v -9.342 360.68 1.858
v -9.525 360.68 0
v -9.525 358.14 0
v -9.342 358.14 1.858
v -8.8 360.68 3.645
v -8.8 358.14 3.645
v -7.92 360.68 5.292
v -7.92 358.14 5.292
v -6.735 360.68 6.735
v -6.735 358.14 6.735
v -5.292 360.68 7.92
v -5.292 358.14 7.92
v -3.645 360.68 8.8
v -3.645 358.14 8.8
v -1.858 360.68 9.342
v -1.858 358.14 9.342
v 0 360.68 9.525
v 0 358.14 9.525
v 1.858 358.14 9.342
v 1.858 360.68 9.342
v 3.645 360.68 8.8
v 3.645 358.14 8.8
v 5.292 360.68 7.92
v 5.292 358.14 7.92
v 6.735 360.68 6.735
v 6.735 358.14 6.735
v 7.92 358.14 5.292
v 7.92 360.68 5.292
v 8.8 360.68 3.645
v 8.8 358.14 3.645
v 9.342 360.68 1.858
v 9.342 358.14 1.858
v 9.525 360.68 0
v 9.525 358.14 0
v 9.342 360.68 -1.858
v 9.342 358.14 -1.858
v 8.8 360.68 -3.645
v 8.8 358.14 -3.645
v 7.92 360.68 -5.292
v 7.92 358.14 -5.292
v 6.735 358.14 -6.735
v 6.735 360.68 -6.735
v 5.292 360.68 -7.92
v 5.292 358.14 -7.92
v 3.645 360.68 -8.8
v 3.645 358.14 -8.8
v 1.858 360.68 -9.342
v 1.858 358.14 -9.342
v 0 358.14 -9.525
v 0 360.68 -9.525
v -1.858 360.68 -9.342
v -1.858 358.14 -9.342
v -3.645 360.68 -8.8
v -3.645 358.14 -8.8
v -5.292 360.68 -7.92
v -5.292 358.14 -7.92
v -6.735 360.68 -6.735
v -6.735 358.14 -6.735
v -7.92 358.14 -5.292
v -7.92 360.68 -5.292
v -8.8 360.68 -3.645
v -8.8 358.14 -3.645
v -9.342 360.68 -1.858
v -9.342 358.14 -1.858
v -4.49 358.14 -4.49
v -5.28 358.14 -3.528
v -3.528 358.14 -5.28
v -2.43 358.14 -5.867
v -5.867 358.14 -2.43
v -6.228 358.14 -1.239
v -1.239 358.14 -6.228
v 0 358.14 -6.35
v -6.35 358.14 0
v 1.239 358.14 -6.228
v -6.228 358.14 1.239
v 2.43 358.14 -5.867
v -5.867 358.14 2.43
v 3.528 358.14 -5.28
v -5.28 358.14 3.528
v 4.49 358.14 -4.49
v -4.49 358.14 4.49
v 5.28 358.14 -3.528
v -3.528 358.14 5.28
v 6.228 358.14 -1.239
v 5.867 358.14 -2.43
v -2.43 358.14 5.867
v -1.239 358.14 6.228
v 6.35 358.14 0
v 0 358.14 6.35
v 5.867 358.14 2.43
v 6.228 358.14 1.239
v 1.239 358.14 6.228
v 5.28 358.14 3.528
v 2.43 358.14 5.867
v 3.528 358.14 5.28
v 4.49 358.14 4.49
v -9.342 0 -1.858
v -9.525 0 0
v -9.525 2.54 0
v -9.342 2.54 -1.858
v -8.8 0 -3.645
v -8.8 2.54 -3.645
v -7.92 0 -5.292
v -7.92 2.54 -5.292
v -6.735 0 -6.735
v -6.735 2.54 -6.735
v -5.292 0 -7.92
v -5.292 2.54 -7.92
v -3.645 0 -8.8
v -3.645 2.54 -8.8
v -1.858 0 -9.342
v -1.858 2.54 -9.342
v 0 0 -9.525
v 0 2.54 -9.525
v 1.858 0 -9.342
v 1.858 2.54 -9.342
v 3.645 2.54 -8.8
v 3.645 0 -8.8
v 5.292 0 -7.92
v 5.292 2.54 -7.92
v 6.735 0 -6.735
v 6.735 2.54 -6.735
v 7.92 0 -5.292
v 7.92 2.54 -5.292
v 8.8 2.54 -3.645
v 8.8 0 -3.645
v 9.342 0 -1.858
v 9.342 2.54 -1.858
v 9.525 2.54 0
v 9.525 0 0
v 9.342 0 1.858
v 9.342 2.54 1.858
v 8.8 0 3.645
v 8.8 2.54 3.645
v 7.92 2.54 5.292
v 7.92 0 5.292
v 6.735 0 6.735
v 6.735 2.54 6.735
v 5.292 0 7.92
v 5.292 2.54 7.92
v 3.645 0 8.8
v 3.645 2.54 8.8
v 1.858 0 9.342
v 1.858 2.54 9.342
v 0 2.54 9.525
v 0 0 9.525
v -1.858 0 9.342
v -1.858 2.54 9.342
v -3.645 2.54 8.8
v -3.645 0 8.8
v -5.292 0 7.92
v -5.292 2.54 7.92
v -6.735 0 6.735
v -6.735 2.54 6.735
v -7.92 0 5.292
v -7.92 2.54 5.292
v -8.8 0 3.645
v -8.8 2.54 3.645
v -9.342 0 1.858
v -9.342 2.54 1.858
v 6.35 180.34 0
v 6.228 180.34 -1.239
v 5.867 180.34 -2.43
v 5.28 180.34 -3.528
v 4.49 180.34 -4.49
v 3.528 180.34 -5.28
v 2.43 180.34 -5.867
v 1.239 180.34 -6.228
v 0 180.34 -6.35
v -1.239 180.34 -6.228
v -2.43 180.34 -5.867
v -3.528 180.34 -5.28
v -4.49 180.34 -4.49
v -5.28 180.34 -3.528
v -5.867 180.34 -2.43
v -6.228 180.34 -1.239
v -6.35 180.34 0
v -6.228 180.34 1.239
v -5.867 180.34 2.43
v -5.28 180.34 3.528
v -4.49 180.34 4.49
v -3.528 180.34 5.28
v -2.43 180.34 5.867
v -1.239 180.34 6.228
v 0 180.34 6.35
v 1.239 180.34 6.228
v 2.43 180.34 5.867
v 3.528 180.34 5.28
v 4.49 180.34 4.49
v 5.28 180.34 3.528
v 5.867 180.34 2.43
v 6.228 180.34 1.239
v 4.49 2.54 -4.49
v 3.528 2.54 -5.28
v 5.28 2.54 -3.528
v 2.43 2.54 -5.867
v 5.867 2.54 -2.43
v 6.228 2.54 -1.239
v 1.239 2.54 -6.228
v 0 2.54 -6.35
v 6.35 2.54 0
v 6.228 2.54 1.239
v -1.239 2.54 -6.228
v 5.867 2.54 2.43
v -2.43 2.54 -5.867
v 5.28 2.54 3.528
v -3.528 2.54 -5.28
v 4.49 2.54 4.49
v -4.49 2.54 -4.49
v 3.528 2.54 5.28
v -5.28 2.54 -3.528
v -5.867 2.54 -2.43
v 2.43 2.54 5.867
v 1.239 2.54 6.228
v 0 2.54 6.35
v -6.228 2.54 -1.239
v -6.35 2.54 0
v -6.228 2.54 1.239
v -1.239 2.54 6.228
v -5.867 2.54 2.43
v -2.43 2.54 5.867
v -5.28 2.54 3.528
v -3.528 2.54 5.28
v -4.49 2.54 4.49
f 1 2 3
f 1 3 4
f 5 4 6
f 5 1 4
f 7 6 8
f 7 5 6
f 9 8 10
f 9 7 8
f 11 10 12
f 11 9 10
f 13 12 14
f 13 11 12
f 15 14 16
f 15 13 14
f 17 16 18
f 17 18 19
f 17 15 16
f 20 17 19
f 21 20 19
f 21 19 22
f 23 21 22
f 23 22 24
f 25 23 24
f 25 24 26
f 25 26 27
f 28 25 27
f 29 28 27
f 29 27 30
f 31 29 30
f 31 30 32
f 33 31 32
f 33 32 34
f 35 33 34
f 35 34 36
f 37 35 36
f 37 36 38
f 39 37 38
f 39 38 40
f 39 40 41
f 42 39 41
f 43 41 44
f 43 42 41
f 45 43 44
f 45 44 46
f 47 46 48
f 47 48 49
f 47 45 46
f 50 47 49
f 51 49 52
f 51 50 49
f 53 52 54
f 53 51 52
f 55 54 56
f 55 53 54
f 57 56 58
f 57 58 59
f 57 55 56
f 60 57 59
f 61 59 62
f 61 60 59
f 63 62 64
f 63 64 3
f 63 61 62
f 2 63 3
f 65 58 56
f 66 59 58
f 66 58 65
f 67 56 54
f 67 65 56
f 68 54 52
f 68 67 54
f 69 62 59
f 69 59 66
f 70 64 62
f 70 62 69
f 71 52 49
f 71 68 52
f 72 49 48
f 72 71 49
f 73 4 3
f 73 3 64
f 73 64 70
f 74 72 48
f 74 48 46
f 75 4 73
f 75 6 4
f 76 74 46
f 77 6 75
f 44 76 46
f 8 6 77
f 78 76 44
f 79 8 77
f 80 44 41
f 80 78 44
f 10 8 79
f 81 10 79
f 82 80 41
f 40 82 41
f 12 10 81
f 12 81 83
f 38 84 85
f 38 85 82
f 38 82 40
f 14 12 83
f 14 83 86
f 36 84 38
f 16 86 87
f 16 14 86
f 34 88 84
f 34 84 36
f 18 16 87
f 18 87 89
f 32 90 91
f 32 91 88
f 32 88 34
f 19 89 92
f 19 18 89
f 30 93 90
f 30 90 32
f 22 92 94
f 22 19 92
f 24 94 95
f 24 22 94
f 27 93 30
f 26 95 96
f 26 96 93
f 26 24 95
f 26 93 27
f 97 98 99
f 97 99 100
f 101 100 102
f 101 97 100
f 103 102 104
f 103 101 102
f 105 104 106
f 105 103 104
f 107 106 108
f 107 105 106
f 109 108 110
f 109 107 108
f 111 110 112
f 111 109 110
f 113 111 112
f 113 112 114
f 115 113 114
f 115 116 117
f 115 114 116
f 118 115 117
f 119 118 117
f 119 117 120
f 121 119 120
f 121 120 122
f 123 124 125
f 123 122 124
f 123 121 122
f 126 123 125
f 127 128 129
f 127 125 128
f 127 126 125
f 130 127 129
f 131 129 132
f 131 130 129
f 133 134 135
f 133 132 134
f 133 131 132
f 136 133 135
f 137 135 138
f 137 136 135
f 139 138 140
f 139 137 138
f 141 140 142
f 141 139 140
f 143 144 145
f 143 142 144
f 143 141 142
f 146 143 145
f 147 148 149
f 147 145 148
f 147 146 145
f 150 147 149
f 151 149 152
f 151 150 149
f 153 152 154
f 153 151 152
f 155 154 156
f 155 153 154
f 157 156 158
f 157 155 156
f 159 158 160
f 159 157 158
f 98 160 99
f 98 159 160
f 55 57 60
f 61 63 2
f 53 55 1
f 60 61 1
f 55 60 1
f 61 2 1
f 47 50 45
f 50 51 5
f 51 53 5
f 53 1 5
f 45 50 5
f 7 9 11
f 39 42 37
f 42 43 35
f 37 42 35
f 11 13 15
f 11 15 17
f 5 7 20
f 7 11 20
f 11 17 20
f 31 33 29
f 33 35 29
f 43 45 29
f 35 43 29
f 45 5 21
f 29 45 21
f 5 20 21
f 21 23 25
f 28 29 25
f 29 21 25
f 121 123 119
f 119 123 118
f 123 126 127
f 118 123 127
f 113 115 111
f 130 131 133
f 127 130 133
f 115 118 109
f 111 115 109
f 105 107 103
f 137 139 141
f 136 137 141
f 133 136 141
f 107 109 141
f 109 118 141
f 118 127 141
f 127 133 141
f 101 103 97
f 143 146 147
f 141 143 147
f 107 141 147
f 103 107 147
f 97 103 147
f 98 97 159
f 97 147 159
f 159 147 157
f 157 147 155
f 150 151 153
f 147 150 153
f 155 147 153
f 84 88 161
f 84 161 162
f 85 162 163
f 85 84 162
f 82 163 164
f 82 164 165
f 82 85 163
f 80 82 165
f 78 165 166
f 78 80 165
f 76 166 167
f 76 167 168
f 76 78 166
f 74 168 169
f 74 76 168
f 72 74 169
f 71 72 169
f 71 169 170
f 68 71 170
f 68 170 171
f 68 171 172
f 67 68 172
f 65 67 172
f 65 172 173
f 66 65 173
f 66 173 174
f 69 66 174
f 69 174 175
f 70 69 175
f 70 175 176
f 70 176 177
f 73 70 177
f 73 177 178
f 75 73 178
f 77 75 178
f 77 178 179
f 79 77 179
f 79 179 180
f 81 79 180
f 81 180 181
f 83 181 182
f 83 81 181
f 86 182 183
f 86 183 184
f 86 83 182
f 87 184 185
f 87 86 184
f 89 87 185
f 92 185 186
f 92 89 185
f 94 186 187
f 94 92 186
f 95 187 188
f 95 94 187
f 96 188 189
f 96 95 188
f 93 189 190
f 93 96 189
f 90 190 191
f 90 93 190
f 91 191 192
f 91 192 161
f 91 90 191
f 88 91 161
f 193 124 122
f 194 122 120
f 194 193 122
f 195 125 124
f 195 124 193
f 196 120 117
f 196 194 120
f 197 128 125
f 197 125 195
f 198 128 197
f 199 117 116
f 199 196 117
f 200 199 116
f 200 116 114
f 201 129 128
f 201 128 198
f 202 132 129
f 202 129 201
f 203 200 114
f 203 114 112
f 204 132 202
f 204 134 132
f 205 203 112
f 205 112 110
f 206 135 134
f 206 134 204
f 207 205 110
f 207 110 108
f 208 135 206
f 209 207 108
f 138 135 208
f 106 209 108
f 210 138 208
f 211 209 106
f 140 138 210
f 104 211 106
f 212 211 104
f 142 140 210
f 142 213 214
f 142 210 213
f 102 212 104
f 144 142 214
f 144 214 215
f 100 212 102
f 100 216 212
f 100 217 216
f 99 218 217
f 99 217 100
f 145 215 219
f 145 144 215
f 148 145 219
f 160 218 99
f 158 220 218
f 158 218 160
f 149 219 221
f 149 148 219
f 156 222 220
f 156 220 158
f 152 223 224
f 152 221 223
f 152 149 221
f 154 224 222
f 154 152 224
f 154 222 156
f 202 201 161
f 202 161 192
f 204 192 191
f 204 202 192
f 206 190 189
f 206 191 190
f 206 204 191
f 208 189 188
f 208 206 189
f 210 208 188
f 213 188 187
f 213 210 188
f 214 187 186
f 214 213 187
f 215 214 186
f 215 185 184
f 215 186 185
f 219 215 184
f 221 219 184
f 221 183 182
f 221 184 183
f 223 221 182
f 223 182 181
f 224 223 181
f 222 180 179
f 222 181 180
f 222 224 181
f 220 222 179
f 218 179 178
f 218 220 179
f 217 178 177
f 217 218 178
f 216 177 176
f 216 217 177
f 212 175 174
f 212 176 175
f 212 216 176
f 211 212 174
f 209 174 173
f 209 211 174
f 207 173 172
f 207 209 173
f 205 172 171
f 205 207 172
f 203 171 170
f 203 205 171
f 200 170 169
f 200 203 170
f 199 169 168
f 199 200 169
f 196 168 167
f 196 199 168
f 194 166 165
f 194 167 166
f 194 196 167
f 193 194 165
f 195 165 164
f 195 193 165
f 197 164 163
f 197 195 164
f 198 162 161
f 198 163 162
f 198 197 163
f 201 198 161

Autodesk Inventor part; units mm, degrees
ref_plane "YZ Plane" through (0, 0, 0) normal (1, 0, 0) x (0, 1, 0)
ref_plane "XZ Plane" through (0, 0, 0) normal (0, 1, 0) x (-1, 0, 0)
ref_plane "XY Plane" through (0, 0, 0) normal (0, 0, 1) x (1, 0, 0)
sketch "Sketch1" plane through (0, 0, 0) normal (0, 1, 0) x (-1, 0, 0)
  circle A0 centre (0, 0) radius 9.525
  dimension "d0" = 19.05
extrude "Extrusion1" add sketch "Sketch1" along normal blind 2.54
sketch "Sketch2" plane through (0, 2.54, 0) normal (0, 1, 0) x (1, 0, 0)
  circle A0 centre (0, 0) radius 9.525 projected
  circle A1 centre (0, 0) radius 6.35
  dimension "d3" = 12.7
extrude "Extrusion2" add sketch "Sketch2" along normal blind 177.8 contours A1
mirror "Mirror1" about plane through (0, 180.34, 0) normal (0, 1, 0) of "Extrusion1"
mirror "Mirror2" about plane through (0, 180.34, 0) normal (0, 1, 0) of "Extrusion2"
properties part number "pole 1"
